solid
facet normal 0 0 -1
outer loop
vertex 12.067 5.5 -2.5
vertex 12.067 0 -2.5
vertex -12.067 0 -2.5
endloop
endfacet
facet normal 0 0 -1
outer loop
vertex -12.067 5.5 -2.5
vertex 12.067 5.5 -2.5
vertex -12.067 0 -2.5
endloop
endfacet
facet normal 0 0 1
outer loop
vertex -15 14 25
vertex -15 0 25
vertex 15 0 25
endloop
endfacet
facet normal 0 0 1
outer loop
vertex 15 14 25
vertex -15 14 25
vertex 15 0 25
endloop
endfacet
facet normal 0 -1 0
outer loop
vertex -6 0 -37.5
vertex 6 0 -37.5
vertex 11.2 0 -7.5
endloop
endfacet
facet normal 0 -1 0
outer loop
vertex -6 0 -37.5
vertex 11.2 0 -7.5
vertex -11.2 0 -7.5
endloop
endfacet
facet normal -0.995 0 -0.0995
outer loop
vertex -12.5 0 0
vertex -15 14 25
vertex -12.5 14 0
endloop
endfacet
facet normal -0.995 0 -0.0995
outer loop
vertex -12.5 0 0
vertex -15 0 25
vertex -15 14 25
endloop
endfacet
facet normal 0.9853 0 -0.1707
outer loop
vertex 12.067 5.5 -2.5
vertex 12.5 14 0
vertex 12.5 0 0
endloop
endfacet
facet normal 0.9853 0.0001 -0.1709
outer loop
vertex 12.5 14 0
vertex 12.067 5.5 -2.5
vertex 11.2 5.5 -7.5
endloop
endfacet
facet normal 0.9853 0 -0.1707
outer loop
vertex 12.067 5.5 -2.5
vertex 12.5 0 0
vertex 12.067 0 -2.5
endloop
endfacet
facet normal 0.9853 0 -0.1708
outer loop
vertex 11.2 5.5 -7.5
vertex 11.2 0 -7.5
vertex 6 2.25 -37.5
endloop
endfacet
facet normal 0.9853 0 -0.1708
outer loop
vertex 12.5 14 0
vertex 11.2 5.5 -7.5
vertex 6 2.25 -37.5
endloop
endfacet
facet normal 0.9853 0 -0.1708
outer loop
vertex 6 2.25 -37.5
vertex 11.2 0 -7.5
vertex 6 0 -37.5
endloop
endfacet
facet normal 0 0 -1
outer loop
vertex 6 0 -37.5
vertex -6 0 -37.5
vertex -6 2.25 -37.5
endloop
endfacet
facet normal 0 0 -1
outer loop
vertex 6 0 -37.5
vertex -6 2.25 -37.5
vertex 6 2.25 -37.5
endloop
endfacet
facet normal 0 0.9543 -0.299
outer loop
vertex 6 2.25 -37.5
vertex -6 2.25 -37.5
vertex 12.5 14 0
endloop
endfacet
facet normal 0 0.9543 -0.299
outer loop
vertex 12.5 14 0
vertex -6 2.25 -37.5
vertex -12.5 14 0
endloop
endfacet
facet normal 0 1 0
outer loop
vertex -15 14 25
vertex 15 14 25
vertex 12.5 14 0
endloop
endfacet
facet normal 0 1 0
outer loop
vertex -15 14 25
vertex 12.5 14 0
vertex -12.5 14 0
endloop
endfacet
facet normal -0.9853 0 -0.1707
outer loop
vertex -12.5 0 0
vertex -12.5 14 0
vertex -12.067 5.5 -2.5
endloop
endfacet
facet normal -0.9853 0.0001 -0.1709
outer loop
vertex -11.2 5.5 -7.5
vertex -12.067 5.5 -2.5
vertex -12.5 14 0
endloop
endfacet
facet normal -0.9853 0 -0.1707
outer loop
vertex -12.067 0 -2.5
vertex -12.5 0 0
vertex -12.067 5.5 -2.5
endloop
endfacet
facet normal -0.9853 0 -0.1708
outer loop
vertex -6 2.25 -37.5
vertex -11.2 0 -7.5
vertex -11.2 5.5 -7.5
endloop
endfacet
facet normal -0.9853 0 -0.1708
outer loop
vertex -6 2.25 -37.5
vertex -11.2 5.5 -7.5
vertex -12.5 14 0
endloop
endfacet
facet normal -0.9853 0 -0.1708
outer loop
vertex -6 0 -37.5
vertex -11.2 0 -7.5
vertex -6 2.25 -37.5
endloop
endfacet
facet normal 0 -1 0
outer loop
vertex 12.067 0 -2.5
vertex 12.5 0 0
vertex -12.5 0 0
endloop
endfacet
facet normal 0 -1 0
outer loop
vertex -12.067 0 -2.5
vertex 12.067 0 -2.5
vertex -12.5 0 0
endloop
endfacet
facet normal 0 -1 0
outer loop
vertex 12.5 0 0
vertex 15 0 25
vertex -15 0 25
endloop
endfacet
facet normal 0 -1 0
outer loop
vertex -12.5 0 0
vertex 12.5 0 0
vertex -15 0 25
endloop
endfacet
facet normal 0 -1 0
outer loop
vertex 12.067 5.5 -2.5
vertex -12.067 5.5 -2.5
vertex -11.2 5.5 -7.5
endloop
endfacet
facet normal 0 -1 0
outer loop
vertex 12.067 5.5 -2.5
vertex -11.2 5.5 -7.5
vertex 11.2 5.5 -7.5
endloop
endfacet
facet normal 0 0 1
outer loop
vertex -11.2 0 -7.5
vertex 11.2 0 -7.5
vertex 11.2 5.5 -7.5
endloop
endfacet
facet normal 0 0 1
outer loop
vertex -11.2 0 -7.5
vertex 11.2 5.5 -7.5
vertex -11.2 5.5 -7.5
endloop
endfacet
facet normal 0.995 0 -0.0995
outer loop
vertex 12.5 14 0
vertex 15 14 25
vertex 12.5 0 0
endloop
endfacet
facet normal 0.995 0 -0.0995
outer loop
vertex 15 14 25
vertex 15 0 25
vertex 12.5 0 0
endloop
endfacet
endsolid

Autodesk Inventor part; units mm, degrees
ref_plane "YZ Plane" through (0, 0, 0) normal (1, 0, 0) x (0, 1, 0)
ref_plane "XZ Plane" through (0, 0, 0) normal (0, 1, 0) x (-1, 0, 0)
ref_plane "XY Plane" through (0, 0, 0) normal (0, 0, 1) x (1, 0, 0)
sketch "Sketch1" plane through (0, 0, 0) normal (0, 1, 0) x (-1, 0, 0)
  line L0 (15, 25) -> (-15, 25)
  line L1 (12.5, 0) -> (-12.5, 0)
  line L2 (6, -37.5) -> (-6, -37.5)
  line L3 (15, 25) -> (12.5, 0)
  line L4 (6, -37.5) -> (12.5, 0)
  line L5 (-15, 25) -> (-12.5, 0)
  line L6 (-12.5, 0) -> (-6, -37.5)
  line L7 (21, 0) -> (-21, 0) projected
  line L8 (0, -50) -> (0, 37.5) projected
  point P0 (0, 0)
  point P1 (0, 25)
  point P2 (0, 0)
  point P3 (0, -37.5)
  dimension "d0" = 30
  dimension "d1" = 25
  dimension "d2" = 12
  dimension "d3" = 25
  dimension "d4" = 37.5
extrude "Extrusion1" add sketch "Sketch1" along normal blind 14 contours L3 L1 L8 L0 | L8 L1 L5 L0
sketch "Sketch2" plane through (0, 0, 0) normal (0, 1, 0) x (-1, 0, 0)
  line L0 (6, -37.5) -> (-6, -37.5)
  line L1 (-12.5, 0) -> (12.5, 0) projected
  line L2 (12.5, 0) -> (15, 25) projected
  line L3 (12.5, 0) -> (6, -37.5)
  line L4 (-12.5, 0) -> (-6, -37.5)
  line L5 (12.5, 0) -> (-12.5, 0)
  point P0 (0, 0)
  point P1 (0, -37.5)
  point P2 (0, 0)
  dimension "d7" = 12
  dimension "d8" = 37.5
extrude "Extrusion2" add sketch "Sketch2" along normal blind 14
sketch "Sketch3" plane through (0, 0, 0) normal (1, 0, 0) x (0, 1, 0)
  line L0 (-2.8, 0) -> (16.8, 0) projected
  line L1 (0, -50) -> (0, 37.5) projected
  line L2 (0, -37.5) -> (14, -37.5) projected
  line L3 (14, -37.5) -> (14, 0) projected
  line L4 (0, -37.5) -> (0, 0) projected
  line L5 (14, 0) -> (14, 25) projected
  line L6 (0, 25) -> (14, 25) projected
  line L7 (0, 0) -> (14, 0) projected
  line L8 (0, -37.5) -> (2.25, -37.5)
  line L9 (2.25, -37.5) -> (14, 0)
  line L10 (14, 0) -> (14, -37.5)
  line L11 (2.25, -37.5) -> (14, -37.5)
  dimension "d11" = 2.25
extrude "Extrusion3" cut sketch "Sketch3" along normal through all both and the other way through all contours L3 L2 L9
sketch "Sketch4" plane through (0, 0, 0) normal (0, -1, 0) x (1, 0, 0)
  line L0 (12.5, 0) -> (6, -37.5) projected
  line L1 (12.0667, -2.5) -> (-12.0667, -2.5)
  line L2 (-6, -37.5) -> (-12.5, 0) projected
  line L3 (11.2, -7.5) -> (-11.2, -7.5)
  line L4 (-15, 25) -> (15, 25) projected
  line L5 (12.0667, -2.5) -> (11.2, -7.5)
  line L6 (-12.0667, -2.5) -> (-11.2, -7.5)
  point P0 (0, 0)
  dimension "d14" = 27.5
  dimension "d15" = 5
extrude "Extrusion4" cut sketch "Sketch4" against normal blind 5.5
properties part number "FP Front Hood"
